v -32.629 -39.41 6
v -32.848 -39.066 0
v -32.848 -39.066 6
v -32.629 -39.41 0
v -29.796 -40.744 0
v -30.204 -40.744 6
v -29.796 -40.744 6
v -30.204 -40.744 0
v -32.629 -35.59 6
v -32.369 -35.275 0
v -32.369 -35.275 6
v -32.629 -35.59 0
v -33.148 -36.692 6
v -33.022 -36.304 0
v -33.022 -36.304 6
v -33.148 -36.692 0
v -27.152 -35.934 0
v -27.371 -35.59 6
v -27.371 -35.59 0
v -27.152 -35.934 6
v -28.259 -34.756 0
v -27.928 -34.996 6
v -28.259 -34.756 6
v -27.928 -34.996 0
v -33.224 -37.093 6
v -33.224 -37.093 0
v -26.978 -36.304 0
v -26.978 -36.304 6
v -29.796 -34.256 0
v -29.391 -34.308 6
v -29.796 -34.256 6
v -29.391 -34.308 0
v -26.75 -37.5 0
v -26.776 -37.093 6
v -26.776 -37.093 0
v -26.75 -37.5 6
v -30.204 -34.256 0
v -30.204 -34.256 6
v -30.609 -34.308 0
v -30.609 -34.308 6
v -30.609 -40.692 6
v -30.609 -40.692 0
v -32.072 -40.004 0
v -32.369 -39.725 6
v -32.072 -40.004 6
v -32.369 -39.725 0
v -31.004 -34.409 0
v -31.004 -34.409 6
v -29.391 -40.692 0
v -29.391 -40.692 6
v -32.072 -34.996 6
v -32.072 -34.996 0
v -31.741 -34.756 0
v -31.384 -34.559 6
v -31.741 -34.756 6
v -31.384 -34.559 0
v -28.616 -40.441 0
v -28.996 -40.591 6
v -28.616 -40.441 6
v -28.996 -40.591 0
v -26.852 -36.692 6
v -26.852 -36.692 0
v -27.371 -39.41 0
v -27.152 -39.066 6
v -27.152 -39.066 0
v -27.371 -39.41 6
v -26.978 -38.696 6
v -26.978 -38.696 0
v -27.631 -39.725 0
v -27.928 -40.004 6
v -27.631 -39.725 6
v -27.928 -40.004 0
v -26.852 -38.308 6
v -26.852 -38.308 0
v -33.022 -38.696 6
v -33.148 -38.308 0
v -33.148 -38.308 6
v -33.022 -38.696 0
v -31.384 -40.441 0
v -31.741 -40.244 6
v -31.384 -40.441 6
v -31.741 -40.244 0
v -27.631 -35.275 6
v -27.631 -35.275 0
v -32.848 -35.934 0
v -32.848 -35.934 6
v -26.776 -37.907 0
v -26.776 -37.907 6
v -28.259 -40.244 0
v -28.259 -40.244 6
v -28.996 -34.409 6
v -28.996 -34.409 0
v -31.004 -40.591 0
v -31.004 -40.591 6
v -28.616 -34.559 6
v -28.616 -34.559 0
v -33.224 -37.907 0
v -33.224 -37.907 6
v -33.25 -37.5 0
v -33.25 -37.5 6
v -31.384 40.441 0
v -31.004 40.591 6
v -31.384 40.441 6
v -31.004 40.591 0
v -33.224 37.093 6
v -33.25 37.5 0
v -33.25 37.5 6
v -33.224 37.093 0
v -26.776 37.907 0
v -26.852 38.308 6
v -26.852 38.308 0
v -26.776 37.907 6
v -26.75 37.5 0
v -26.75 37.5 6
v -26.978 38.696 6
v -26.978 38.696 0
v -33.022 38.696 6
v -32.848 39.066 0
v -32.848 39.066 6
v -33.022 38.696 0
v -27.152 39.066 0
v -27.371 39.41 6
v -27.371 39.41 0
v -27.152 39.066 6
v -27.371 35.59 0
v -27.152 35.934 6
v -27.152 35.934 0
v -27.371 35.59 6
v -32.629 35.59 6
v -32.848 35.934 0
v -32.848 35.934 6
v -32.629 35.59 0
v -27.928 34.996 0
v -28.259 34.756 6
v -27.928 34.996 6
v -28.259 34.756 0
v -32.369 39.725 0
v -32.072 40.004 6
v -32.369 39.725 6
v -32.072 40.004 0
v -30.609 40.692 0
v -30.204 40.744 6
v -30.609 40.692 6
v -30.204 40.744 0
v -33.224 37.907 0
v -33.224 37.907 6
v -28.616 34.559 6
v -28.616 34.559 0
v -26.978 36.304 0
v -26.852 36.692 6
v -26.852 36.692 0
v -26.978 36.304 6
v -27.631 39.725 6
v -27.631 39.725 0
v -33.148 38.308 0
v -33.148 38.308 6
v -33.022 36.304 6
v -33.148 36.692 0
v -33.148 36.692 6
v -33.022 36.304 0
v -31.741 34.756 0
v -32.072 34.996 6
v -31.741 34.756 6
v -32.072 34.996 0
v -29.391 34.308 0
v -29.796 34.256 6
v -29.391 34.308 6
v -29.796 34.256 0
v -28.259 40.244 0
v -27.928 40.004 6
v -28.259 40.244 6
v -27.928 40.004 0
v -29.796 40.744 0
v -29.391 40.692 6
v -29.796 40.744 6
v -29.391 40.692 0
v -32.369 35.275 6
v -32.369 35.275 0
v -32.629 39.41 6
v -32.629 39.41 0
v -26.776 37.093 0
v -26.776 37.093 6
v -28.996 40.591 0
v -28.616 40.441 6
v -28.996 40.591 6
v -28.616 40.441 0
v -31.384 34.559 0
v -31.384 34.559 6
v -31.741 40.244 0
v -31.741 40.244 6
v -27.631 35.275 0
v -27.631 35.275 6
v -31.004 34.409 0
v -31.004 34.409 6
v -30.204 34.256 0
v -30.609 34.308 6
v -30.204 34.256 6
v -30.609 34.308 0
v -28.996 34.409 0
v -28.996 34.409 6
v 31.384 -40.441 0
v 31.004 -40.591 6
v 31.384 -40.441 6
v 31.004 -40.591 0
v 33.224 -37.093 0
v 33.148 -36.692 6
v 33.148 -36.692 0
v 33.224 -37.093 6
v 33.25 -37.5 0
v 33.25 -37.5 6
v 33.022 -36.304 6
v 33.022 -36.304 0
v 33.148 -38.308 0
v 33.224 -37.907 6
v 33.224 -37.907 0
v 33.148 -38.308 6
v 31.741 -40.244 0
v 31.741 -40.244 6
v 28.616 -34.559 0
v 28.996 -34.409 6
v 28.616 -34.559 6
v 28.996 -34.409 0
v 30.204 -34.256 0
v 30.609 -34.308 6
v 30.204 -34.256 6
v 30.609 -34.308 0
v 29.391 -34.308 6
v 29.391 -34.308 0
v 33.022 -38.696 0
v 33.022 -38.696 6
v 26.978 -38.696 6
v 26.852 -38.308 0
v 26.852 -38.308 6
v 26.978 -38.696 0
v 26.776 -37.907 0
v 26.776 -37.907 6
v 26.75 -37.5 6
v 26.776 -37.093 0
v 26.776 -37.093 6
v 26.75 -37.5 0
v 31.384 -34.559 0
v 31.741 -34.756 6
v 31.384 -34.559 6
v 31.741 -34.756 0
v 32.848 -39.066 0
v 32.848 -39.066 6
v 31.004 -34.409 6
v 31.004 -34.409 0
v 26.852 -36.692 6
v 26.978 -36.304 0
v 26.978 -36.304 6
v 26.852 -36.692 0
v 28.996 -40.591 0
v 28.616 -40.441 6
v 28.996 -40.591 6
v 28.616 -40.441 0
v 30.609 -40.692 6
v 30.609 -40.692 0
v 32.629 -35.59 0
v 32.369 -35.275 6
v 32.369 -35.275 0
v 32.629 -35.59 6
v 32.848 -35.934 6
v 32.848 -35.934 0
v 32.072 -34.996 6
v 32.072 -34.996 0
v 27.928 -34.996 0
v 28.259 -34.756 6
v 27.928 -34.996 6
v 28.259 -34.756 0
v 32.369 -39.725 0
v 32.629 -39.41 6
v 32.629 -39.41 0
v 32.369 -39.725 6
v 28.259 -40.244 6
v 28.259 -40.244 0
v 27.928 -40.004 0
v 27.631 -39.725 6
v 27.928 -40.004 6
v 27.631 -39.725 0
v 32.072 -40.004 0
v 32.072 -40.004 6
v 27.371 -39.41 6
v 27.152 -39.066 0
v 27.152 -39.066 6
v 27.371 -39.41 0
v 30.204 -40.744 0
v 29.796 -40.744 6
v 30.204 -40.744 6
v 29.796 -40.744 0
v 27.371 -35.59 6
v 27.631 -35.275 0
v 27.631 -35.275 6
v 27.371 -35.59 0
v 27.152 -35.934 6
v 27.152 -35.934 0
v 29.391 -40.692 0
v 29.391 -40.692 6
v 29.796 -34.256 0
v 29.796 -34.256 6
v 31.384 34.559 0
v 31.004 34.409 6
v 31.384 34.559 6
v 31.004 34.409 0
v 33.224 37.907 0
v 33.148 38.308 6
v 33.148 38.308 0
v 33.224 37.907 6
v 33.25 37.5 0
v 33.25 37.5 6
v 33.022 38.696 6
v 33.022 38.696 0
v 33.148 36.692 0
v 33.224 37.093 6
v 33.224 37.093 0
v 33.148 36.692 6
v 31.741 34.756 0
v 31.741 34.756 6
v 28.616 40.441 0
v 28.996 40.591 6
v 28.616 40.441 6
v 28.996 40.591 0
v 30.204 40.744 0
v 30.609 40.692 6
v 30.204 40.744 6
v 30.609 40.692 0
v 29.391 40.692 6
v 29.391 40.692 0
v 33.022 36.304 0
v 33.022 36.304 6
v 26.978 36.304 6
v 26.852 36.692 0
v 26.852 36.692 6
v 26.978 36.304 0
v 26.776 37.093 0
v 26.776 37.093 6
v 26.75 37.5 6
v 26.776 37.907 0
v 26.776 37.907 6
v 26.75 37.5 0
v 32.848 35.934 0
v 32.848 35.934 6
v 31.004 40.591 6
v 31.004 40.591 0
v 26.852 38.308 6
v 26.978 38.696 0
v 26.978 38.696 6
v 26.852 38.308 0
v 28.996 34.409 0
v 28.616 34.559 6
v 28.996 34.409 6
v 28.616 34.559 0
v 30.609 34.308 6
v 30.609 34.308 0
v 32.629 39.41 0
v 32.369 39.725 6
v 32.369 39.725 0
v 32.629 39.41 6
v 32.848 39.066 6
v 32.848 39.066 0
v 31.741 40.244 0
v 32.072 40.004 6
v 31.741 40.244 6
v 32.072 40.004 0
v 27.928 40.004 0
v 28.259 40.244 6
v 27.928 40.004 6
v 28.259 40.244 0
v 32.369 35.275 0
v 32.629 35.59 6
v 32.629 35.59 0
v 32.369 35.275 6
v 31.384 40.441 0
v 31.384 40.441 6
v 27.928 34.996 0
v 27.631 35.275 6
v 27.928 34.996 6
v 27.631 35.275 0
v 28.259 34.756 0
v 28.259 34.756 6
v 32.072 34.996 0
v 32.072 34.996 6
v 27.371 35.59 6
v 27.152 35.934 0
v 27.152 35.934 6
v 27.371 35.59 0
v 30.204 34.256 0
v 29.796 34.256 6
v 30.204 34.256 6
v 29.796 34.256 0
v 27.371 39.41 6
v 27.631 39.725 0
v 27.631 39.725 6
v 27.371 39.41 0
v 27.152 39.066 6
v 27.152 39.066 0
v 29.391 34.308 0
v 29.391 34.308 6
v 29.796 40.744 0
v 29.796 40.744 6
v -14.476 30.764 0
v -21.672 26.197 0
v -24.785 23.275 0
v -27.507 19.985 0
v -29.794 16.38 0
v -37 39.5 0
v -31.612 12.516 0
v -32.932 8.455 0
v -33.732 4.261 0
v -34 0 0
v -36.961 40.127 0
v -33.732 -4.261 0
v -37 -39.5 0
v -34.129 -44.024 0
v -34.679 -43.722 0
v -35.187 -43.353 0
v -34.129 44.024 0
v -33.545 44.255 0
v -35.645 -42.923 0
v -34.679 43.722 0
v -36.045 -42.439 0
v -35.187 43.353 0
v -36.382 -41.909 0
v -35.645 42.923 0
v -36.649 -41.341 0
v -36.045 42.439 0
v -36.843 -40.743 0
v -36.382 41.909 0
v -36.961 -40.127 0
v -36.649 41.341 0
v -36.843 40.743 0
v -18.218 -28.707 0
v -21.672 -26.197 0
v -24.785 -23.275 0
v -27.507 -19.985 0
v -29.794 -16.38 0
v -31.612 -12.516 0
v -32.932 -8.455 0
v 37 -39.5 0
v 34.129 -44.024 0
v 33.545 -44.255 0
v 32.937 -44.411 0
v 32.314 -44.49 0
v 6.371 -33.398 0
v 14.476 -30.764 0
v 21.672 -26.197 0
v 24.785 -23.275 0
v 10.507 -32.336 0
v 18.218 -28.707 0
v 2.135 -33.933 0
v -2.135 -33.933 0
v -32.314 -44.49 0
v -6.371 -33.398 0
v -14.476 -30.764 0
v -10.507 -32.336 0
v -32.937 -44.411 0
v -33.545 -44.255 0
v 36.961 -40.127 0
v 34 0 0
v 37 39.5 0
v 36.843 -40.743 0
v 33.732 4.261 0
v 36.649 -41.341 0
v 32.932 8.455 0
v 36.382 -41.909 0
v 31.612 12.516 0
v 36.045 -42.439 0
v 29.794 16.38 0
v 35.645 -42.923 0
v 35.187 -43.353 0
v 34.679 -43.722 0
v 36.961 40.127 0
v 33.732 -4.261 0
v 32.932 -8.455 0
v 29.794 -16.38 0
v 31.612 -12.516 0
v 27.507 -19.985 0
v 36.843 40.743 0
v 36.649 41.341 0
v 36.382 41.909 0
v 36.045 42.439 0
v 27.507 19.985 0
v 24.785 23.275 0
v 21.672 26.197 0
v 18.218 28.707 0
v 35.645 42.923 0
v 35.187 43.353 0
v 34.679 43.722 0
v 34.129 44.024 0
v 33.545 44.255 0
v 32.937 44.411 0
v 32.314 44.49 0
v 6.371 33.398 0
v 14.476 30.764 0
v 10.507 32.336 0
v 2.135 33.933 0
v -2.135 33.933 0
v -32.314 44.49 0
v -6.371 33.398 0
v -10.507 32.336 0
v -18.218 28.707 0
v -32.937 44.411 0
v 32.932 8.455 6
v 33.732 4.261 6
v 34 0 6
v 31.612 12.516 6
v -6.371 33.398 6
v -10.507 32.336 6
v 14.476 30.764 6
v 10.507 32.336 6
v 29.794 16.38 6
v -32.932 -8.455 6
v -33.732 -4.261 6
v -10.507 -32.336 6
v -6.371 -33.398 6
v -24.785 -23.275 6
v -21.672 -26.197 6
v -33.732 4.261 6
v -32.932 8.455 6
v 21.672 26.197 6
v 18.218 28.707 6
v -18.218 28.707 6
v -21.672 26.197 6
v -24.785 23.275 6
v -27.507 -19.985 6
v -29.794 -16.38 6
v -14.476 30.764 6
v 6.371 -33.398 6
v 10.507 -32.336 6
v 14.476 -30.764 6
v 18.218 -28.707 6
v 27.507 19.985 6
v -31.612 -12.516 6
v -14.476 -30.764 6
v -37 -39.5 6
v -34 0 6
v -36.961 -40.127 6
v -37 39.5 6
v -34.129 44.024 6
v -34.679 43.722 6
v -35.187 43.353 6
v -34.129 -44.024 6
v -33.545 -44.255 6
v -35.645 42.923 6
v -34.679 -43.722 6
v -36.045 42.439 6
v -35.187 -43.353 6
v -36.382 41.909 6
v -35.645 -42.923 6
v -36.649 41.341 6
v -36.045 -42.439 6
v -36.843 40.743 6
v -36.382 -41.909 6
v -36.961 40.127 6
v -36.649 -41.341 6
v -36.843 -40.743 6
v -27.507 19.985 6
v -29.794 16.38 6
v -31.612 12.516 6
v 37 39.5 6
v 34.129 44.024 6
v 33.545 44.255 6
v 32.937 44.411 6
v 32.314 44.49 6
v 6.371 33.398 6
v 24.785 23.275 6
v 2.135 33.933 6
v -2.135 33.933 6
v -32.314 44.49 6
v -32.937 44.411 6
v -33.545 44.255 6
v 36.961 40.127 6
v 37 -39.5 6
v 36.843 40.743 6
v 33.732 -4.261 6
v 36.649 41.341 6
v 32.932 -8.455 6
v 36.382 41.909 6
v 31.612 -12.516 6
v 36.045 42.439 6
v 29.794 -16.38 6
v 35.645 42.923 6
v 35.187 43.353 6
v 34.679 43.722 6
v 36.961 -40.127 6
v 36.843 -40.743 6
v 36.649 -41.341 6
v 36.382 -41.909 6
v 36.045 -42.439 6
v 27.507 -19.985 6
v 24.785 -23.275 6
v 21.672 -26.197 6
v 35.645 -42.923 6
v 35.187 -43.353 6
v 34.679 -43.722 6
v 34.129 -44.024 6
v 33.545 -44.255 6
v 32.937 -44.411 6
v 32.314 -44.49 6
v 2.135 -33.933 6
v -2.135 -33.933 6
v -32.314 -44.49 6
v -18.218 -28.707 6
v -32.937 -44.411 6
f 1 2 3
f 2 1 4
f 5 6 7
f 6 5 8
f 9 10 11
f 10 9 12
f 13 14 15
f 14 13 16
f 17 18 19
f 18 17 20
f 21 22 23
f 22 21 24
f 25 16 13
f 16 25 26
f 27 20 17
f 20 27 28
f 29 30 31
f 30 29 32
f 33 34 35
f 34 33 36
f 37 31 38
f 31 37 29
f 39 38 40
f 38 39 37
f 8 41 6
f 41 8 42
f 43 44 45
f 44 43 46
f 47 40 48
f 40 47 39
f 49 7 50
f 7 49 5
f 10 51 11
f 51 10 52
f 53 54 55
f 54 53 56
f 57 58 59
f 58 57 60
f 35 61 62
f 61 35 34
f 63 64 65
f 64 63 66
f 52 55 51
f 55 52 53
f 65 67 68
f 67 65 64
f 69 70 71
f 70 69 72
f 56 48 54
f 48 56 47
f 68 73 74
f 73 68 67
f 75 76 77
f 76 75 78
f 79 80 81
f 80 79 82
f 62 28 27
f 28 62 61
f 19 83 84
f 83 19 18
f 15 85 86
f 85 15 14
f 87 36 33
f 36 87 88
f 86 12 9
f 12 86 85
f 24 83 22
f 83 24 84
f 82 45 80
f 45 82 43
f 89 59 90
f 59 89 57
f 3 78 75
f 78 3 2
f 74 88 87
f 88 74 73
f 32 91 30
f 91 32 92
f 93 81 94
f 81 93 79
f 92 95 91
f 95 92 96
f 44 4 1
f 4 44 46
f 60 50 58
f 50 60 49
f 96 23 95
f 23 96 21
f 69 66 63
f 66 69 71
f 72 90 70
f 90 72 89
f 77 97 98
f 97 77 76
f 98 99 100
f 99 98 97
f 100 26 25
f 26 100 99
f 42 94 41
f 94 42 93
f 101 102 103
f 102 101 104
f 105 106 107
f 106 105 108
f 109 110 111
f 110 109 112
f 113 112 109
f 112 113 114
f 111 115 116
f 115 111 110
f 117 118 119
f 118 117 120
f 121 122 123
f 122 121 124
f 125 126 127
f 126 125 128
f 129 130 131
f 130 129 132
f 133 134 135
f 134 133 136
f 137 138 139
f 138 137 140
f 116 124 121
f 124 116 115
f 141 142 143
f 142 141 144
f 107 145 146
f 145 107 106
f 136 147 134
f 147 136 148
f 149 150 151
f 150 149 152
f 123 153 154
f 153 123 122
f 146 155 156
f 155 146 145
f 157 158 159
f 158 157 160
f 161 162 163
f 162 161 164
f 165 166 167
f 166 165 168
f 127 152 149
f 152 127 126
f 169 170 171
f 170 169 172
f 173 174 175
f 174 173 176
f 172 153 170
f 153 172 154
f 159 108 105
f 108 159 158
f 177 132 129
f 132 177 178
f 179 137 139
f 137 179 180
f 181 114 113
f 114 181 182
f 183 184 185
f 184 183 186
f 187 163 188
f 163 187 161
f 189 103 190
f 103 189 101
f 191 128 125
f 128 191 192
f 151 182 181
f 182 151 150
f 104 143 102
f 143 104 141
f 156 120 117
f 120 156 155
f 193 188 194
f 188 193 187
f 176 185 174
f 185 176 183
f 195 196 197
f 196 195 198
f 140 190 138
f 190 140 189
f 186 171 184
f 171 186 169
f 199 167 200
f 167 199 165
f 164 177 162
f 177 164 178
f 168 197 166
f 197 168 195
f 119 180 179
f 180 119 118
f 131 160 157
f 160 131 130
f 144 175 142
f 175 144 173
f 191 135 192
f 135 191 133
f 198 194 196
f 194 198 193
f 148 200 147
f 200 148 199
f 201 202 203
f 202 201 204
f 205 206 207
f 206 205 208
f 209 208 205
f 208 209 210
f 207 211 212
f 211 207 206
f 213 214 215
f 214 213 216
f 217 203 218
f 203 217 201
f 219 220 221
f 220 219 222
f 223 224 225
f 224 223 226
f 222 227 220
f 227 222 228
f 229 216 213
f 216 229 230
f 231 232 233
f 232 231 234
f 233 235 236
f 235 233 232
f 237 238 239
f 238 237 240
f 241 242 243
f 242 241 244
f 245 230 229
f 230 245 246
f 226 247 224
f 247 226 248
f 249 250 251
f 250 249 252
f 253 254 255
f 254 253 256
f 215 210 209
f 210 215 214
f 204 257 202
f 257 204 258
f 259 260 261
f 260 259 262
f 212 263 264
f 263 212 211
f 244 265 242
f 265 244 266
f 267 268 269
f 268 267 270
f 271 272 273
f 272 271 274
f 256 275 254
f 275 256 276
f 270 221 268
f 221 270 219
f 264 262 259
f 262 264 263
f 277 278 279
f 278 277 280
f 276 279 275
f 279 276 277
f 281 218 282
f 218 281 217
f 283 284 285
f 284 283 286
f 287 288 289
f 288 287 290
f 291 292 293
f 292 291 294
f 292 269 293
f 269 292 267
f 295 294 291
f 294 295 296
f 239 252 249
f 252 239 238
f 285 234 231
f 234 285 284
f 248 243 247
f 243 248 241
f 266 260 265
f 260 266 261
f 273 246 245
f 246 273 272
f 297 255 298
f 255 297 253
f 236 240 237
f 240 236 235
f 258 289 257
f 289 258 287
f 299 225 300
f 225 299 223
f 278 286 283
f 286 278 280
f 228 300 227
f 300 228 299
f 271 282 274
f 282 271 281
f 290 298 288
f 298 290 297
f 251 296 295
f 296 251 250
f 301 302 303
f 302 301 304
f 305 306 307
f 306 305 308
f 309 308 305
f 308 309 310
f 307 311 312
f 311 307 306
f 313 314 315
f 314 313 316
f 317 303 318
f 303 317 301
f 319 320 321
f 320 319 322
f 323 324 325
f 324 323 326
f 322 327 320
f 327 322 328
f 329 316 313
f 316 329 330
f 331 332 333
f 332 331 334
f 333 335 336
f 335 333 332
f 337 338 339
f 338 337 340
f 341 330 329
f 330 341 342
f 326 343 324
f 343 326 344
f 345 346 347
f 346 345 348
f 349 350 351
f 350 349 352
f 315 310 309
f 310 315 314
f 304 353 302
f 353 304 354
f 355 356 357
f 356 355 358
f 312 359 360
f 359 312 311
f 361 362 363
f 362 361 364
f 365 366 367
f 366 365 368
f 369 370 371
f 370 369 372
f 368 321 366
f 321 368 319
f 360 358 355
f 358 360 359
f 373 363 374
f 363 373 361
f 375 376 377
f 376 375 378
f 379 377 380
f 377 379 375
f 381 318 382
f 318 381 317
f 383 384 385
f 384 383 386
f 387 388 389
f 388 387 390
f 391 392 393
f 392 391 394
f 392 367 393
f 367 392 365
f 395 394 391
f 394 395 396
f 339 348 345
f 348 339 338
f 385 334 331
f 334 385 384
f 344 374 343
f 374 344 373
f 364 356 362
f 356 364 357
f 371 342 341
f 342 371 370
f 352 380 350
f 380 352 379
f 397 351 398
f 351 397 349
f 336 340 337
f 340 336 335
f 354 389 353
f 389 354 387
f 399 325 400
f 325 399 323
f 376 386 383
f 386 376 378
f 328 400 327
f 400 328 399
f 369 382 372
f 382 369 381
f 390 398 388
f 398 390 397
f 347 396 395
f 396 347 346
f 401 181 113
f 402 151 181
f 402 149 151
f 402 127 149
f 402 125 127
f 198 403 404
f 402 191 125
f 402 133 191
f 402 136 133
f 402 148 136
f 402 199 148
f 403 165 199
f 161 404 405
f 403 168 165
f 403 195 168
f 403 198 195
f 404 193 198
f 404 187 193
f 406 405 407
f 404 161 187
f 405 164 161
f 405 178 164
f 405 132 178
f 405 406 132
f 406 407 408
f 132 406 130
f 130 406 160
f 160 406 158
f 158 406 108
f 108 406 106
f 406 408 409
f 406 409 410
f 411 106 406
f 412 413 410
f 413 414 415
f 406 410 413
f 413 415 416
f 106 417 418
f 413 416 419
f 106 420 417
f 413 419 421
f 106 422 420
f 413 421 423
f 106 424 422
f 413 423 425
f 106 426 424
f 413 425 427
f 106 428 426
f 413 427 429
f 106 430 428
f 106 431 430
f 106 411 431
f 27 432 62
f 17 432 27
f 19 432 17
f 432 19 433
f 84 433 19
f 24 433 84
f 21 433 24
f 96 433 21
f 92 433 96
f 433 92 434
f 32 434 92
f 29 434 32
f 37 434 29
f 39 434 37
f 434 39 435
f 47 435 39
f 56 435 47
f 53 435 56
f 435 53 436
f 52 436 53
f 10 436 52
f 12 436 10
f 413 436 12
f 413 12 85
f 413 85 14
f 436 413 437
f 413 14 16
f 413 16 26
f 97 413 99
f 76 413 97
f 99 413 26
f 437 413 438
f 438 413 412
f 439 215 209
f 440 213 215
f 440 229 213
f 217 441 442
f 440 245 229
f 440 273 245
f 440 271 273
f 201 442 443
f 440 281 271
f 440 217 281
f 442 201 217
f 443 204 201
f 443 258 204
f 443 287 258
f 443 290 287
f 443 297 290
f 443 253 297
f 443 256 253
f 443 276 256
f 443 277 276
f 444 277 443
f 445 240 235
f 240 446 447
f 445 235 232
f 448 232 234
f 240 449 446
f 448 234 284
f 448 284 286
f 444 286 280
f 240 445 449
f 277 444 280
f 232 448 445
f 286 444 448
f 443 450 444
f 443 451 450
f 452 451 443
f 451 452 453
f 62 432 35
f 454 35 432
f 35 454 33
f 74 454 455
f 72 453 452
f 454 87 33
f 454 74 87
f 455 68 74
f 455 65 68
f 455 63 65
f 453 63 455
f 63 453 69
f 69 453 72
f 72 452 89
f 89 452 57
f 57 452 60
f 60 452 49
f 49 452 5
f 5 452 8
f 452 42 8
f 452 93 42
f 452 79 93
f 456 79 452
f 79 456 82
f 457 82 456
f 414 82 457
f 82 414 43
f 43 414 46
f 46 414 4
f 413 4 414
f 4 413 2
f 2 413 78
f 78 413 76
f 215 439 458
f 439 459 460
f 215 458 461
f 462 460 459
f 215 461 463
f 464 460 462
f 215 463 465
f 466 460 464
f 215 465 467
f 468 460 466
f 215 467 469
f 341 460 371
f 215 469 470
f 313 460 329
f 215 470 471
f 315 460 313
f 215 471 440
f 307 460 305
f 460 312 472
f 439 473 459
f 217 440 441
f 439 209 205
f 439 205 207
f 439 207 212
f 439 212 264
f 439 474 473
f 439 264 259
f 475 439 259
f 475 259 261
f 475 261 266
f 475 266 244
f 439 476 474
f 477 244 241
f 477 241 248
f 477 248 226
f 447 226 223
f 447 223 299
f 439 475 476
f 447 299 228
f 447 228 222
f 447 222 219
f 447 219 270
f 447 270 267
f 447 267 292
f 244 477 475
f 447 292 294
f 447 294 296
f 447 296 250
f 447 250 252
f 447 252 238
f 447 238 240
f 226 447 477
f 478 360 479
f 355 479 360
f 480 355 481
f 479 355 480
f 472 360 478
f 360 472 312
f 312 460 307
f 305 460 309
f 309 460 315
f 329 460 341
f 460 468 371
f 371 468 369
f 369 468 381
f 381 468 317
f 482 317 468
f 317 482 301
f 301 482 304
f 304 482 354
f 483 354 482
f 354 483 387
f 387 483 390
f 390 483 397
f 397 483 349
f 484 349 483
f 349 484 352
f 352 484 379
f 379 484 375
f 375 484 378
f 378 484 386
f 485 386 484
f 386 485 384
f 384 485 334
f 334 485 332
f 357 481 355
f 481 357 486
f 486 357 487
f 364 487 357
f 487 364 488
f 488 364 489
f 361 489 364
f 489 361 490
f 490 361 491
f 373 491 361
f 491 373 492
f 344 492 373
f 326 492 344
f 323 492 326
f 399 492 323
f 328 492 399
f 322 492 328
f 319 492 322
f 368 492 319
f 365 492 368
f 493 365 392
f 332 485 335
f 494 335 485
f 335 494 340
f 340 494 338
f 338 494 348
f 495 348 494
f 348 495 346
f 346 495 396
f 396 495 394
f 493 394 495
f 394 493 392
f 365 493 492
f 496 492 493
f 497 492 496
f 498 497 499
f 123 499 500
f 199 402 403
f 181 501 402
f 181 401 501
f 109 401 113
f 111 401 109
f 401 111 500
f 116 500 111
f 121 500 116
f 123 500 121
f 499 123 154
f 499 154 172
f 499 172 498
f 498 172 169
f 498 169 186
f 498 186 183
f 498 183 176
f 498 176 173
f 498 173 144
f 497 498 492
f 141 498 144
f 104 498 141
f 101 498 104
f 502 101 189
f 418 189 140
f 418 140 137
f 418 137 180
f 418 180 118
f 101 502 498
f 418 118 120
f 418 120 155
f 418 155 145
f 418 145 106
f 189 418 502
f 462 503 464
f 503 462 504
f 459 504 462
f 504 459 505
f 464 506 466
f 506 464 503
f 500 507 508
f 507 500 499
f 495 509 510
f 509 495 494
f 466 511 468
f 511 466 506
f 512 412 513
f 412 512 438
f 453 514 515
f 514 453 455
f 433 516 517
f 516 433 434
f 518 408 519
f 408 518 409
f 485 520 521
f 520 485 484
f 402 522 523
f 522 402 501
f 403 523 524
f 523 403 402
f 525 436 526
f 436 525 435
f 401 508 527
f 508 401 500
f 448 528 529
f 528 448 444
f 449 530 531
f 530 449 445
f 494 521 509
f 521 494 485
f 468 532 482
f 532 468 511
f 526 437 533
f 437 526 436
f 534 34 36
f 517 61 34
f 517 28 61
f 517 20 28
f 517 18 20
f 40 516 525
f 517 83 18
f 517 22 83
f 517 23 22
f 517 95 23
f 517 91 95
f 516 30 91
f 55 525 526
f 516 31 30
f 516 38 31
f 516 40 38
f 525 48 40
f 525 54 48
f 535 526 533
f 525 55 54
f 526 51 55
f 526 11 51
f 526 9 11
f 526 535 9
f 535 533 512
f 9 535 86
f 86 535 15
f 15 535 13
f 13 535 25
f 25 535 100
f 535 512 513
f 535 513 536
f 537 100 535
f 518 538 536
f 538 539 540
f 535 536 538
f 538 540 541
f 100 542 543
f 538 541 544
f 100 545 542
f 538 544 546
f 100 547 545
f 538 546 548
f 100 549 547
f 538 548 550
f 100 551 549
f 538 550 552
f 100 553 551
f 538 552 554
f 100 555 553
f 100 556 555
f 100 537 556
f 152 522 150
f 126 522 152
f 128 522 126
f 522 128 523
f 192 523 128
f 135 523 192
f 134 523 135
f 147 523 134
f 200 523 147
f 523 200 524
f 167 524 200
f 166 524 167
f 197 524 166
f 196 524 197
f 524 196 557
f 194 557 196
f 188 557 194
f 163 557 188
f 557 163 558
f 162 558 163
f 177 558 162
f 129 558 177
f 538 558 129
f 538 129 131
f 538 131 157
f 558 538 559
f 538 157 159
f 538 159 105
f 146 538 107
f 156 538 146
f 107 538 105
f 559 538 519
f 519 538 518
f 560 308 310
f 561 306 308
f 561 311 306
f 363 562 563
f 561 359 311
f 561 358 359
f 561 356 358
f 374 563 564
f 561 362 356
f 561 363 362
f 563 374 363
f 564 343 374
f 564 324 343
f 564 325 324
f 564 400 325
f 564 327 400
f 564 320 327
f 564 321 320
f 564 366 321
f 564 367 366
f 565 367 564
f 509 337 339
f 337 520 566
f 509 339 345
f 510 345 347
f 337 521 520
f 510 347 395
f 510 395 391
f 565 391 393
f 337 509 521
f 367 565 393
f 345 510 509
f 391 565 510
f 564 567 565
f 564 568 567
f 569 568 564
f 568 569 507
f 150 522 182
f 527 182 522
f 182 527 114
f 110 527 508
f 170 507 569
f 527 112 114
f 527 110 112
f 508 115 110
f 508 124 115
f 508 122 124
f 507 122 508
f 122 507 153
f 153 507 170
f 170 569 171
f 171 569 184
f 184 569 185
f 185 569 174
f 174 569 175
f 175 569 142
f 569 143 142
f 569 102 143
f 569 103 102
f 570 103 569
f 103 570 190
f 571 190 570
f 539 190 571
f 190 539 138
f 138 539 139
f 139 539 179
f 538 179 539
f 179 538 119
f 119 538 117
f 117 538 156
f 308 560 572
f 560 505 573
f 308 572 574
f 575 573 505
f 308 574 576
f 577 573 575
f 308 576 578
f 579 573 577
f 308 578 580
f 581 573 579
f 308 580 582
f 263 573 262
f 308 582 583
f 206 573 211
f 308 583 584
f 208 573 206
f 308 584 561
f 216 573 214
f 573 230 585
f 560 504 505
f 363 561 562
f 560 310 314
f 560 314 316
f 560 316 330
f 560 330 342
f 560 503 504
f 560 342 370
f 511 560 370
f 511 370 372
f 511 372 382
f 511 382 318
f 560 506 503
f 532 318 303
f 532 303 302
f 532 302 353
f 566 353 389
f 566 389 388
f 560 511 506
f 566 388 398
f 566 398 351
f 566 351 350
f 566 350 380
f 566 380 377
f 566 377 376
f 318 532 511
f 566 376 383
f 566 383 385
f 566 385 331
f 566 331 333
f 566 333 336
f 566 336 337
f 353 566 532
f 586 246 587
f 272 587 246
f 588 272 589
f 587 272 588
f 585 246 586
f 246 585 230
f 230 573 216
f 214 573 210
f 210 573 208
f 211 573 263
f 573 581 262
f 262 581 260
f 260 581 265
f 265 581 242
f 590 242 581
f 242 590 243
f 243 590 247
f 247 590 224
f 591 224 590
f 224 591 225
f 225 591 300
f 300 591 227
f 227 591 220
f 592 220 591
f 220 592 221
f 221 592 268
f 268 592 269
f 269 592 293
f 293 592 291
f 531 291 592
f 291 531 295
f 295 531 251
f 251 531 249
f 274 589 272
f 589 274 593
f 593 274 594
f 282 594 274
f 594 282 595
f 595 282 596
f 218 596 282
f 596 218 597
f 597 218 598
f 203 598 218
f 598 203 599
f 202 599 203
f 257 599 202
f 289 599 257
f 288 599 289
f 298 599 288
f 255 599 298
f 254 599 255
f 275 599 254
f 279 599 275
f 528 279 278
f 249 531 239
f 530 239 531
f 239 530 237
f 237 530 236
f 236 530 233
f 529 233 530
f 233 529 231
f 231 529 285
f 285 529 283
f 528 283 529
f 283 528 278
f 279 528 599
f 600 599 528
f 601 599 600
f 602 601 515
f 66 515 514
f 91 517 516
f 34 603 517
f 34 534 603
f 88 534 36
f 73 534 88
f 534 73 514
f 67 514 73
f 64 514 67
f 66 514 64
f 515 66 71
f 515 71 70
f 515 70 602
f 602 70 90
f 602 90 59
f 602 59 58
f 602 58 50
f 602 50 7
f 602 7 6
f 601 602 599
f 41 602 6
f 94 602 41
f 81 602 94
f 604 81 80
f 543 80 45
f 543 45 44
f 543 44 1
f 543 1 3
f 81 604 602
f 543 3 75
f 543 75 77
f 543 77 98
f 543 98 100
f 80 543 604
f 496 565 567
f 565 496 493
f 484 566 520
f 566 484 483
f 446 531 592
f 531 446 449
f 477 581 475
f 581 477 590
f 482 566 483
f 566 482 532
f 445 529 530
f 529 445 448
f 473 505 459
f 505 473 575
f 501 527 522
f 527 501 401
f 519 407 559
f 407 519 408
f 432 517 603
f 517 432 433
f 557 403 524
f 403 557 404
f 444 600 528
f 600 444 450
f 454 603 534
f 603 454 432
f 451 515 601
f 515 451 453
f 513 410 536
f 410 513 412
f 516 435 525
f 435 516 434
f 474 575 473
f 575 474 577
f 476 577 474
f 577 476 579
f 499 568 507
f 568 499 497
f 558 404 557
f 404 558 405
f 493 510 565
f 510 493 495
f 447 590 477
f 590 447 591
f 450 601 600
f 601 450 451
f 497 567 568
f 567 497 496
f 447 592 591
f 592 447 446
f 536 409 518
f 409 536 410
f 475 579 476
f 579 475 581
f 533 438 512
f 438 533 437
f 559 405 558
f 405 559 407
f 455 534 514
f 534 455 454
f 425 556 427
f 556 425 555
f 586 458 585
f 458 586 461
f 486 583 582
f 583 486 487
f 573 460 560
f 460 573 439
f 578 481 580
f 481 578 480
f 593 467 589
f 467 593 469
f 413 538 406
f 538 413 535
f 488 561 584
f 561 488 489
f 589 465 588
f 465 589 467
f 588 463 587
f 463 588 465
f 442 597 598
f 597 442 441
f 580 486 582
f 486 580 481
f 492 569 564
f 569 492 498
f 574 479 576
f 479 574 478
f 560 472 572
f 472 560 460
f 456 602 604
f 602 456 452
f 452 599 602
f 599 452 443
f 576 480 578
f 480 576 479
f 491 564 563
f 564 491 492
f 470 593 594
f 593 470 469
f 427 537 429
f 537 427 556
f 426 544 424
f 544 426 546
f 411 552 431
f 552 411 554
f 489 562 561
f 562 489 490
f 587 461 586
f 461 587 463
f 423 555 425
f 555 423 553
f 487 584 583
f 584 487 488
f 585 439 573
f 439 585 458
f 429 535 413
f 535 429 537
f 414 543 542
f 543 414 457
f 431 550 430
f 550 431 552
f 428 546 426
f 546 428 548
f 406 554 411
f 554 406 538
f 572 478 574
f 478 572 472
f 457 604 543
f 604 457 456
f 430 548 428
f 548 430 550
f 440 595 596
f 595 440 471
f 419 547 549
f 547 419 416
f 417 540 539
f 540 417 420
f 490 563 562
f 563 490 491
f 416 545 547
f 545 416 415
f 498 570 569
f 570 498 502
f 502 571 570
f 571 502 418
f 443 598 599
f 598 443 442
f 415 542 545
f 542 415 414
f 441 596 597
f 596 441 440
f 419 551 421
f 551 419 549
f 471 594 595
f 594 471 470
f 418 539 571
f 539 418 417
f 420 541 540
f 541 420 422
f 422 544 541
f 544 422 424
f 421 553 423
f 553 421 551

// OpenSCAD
$fn = 50;


difference() {
	union() {
		hull() {
			translate(v = [-32.0000000000, 39.5000000000, 0]) {
				cylinder(h = 6, r = 5);
			}
			translate(v = [32.0000000000, 39.5000000000, 0]) {
				cylinder(h = 6, r = 5);
			}
			translate(v = [-32.0000000000, -39.5000000000, 0]) {
				cylinder(h = 6, r = 5);
			}
			translate(v = [32.0000000000, -39.5000000000, 0]) {
				cylinder(h = 6, r = 5);
			}
		}
	}
	union() {
		#translate(v = [-30.0000000000, -37.5000000000, -100.0000000000]) {
			cylinder(h = 200, r = 3.2500000000);
		}
		#translate(v = [-30.0000000000, 37.5000000000, -100.0000000000]) {
			cylinder(h = 200, r = 3.2500000000);
		}
		#translate(v = [30.0000000000, -37.5000000000, -100.0000000000]) {
			cylinder(h = 200, r = 3.2500000000);
		}
		#translate(v = [30.0000000000, 37.5000000000, -100.0000000000]) {
			cylinder(h = 200, r = 3.2500000000);
		}
		#cylinder(h = 6, r = 34.0000000000);
	}
}
